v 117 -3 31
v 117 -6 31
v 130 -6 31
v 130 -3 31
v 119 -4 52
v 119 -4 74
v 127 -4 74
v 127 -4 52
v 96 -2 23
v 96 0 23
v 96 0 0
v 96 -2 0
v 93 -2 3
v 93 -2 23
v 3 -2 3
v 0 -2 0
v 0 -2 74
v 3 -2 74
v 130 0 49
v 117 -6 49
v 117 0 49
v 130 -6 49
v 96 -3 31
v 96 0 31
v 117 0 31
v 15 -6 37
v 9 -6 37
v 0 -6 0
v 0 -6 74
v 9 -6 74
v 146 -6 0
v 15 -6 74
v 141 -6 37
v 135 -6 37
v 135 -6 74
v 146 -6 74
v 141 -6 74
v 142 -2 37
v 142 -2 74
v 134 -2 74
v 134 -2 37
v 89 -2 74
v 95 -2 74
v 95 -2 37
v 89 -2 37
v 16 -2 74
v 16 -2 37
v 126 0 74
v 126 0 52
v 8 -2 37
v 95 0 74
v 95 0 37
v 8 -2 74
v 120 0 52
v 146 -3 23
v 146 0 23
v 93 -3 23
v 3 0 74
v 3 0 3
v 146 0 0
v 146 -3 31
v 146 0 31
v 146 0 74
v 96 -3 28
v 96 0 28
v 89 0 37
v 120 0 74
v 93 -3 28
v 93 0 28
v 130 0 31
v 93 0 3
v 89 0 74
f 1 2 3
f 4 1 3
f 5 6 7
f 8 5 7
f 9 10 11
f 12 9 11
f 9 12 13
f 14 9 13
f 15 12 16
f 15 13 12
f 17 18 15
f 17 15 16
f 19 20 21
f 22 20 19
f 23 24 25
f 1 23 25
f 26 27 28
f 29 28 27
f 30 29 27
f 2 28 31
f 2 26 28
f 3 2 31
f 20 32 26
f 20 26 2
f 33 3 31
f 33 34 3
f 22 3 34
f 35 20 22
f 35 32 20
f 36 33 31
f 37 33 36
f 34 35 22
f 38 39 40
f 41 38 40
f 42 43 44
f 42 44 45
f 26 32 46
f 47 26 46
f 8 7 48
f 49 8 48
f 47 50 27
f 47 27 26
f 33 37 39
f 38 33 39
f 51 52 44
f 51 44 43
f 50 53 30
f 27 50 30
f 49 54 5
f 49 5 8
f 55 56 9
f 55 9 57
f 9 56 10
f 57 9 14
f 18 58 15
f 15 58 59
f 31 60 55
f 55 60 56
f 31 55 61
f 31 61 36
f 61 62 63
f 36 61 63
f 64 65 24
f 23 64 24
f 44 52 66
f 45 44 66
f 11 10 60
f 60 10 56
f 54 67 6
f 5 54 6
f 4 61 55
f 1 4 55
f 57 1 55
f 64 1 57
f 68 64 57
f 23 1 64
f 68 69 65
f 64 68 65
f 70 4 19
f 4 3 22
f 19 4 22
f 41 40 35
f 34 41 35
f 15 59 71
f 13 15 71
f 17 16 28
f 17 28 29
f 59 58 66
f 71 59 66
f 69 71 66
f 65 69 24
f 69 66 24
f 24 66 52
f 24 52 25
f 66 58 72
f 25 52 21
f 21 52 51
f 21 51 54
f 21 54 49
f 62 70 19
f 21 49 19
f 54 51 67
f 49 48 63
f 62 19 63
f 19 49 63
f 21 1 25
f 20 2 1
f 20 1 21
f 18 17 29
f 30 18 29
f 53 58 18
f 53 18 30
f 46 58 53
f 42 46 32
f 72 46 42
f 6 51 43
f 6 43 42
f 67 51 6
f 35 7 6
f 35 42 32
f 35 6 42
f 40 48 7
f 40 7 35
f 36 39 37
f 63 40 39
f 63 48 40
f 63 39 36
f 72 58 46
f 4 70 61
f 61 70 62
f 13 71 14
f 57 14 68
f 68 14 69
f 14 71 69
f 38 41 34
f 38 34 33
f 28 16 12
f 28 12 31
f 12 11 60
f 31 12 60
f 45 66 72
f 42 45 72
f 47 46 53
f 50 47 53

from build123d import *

# Parameters (mm, degrees)
F0_W      = 146
F0_H      = 74
F1_DEPTH  = 6
F2_W      = 13
F2_H      = 18
F3_DEPTH  = 6
F5_DEPTH  = 2
F7_DEPTH  = 3
F6_W      = 6
F6_H      = 37
F8_DEPTH  = 2
F10_DEPTH = 37
F11_DEPTH = 37
F12_DEPTH = 22


with BuildPart() as f1:
    # F0 (on Front) → F1 (new body)
    with BuildSketch(Plane.XZ):
        with Locations((73, 37)):
            Rectangle(F0_W, F0_H)
    extrude(amount=F1_DEPTH)

    # F2 (on face) → F3 (cut)
    with BuildSketch(Plane.XZ.offset(6)):
        with Locations((123.5, 40)):
            Rectangle(F2_W, F2_H)
    extrude(amount=-F3_DEPTH, mode=Mode.SUBTRACT)

    # F4 (on face) → F5 (cut)
    with BuildSketch(Plane(origin=(0, 0, 0), x_dir=(-1, 0, 0), z_dir=(0, 1, 0))):
        Polygon((-96, 23), (-96, 0), (0, 0), (0, 74), (-3, 74), (-3, 3), (-93, 3), (-93, 23), align=None)
    extrude(amount=-F5_DEPTH, mode=Mode.SUBTRACT)

    # F6 (on face) → F7 (cut)
    with BuildSketch(Plane(origin=(0, 0, 0), x_dir=(-1, 0, 0), z_dir=(0, 1, 0))):
        Polygon((-146, 31), (-146, 23), (-96, 23), (-93, 23), (-93, 28), (-96, 28), (-96, 31), (-117, 31), (-130, 31), align=None)
    extrude(amount=-F7_DEPTH, mode=Mode.SUBTRACT)

    # F6 (on face) → F8 (cut)
    with BuildSketch(Plane(origin=(0, 0, 0), x_dir=(-1, 0, 0), z_dir=(0, 1, 0))):
        with Locations((-92, 55.5)):
            Rectangle(F6_W, F6_H)
    extrude(amount=-F8_DEPTH, mode=Mode.SUBTRACT)

    # F9 (on face) → F10 (cut)
    with BuildSketch(Plane.XY.offset(74)):
        Polygon((141, -6), (142, -2), (134, -2), (135, -6), align=None)
    extrude(amount=-F10_DEPTH, mode=Mode.SUBTRACT)

    # F9 (on face) → F11 (cut)
    with BuildSketch(Plane.XY.offset(74)):
        Polygon((15, -6), (16, -2), (8, -2), (9, -6), align=None)
    extrude(amount=-F11_DEPTH, mode=Mode.SUBTRACT)

    # F9 (on face) → F12 (cut)
    with BuildSketch(Plane.XY.offset(74)):
        Polygon((126, -4), (127, -4), (126, 0), (120, 0), (119, -4), (120, -4), align=None)
    extrude(amount=-F12_DEPTH, mode=Mode.SUBTRACT)


solid = f1.part
